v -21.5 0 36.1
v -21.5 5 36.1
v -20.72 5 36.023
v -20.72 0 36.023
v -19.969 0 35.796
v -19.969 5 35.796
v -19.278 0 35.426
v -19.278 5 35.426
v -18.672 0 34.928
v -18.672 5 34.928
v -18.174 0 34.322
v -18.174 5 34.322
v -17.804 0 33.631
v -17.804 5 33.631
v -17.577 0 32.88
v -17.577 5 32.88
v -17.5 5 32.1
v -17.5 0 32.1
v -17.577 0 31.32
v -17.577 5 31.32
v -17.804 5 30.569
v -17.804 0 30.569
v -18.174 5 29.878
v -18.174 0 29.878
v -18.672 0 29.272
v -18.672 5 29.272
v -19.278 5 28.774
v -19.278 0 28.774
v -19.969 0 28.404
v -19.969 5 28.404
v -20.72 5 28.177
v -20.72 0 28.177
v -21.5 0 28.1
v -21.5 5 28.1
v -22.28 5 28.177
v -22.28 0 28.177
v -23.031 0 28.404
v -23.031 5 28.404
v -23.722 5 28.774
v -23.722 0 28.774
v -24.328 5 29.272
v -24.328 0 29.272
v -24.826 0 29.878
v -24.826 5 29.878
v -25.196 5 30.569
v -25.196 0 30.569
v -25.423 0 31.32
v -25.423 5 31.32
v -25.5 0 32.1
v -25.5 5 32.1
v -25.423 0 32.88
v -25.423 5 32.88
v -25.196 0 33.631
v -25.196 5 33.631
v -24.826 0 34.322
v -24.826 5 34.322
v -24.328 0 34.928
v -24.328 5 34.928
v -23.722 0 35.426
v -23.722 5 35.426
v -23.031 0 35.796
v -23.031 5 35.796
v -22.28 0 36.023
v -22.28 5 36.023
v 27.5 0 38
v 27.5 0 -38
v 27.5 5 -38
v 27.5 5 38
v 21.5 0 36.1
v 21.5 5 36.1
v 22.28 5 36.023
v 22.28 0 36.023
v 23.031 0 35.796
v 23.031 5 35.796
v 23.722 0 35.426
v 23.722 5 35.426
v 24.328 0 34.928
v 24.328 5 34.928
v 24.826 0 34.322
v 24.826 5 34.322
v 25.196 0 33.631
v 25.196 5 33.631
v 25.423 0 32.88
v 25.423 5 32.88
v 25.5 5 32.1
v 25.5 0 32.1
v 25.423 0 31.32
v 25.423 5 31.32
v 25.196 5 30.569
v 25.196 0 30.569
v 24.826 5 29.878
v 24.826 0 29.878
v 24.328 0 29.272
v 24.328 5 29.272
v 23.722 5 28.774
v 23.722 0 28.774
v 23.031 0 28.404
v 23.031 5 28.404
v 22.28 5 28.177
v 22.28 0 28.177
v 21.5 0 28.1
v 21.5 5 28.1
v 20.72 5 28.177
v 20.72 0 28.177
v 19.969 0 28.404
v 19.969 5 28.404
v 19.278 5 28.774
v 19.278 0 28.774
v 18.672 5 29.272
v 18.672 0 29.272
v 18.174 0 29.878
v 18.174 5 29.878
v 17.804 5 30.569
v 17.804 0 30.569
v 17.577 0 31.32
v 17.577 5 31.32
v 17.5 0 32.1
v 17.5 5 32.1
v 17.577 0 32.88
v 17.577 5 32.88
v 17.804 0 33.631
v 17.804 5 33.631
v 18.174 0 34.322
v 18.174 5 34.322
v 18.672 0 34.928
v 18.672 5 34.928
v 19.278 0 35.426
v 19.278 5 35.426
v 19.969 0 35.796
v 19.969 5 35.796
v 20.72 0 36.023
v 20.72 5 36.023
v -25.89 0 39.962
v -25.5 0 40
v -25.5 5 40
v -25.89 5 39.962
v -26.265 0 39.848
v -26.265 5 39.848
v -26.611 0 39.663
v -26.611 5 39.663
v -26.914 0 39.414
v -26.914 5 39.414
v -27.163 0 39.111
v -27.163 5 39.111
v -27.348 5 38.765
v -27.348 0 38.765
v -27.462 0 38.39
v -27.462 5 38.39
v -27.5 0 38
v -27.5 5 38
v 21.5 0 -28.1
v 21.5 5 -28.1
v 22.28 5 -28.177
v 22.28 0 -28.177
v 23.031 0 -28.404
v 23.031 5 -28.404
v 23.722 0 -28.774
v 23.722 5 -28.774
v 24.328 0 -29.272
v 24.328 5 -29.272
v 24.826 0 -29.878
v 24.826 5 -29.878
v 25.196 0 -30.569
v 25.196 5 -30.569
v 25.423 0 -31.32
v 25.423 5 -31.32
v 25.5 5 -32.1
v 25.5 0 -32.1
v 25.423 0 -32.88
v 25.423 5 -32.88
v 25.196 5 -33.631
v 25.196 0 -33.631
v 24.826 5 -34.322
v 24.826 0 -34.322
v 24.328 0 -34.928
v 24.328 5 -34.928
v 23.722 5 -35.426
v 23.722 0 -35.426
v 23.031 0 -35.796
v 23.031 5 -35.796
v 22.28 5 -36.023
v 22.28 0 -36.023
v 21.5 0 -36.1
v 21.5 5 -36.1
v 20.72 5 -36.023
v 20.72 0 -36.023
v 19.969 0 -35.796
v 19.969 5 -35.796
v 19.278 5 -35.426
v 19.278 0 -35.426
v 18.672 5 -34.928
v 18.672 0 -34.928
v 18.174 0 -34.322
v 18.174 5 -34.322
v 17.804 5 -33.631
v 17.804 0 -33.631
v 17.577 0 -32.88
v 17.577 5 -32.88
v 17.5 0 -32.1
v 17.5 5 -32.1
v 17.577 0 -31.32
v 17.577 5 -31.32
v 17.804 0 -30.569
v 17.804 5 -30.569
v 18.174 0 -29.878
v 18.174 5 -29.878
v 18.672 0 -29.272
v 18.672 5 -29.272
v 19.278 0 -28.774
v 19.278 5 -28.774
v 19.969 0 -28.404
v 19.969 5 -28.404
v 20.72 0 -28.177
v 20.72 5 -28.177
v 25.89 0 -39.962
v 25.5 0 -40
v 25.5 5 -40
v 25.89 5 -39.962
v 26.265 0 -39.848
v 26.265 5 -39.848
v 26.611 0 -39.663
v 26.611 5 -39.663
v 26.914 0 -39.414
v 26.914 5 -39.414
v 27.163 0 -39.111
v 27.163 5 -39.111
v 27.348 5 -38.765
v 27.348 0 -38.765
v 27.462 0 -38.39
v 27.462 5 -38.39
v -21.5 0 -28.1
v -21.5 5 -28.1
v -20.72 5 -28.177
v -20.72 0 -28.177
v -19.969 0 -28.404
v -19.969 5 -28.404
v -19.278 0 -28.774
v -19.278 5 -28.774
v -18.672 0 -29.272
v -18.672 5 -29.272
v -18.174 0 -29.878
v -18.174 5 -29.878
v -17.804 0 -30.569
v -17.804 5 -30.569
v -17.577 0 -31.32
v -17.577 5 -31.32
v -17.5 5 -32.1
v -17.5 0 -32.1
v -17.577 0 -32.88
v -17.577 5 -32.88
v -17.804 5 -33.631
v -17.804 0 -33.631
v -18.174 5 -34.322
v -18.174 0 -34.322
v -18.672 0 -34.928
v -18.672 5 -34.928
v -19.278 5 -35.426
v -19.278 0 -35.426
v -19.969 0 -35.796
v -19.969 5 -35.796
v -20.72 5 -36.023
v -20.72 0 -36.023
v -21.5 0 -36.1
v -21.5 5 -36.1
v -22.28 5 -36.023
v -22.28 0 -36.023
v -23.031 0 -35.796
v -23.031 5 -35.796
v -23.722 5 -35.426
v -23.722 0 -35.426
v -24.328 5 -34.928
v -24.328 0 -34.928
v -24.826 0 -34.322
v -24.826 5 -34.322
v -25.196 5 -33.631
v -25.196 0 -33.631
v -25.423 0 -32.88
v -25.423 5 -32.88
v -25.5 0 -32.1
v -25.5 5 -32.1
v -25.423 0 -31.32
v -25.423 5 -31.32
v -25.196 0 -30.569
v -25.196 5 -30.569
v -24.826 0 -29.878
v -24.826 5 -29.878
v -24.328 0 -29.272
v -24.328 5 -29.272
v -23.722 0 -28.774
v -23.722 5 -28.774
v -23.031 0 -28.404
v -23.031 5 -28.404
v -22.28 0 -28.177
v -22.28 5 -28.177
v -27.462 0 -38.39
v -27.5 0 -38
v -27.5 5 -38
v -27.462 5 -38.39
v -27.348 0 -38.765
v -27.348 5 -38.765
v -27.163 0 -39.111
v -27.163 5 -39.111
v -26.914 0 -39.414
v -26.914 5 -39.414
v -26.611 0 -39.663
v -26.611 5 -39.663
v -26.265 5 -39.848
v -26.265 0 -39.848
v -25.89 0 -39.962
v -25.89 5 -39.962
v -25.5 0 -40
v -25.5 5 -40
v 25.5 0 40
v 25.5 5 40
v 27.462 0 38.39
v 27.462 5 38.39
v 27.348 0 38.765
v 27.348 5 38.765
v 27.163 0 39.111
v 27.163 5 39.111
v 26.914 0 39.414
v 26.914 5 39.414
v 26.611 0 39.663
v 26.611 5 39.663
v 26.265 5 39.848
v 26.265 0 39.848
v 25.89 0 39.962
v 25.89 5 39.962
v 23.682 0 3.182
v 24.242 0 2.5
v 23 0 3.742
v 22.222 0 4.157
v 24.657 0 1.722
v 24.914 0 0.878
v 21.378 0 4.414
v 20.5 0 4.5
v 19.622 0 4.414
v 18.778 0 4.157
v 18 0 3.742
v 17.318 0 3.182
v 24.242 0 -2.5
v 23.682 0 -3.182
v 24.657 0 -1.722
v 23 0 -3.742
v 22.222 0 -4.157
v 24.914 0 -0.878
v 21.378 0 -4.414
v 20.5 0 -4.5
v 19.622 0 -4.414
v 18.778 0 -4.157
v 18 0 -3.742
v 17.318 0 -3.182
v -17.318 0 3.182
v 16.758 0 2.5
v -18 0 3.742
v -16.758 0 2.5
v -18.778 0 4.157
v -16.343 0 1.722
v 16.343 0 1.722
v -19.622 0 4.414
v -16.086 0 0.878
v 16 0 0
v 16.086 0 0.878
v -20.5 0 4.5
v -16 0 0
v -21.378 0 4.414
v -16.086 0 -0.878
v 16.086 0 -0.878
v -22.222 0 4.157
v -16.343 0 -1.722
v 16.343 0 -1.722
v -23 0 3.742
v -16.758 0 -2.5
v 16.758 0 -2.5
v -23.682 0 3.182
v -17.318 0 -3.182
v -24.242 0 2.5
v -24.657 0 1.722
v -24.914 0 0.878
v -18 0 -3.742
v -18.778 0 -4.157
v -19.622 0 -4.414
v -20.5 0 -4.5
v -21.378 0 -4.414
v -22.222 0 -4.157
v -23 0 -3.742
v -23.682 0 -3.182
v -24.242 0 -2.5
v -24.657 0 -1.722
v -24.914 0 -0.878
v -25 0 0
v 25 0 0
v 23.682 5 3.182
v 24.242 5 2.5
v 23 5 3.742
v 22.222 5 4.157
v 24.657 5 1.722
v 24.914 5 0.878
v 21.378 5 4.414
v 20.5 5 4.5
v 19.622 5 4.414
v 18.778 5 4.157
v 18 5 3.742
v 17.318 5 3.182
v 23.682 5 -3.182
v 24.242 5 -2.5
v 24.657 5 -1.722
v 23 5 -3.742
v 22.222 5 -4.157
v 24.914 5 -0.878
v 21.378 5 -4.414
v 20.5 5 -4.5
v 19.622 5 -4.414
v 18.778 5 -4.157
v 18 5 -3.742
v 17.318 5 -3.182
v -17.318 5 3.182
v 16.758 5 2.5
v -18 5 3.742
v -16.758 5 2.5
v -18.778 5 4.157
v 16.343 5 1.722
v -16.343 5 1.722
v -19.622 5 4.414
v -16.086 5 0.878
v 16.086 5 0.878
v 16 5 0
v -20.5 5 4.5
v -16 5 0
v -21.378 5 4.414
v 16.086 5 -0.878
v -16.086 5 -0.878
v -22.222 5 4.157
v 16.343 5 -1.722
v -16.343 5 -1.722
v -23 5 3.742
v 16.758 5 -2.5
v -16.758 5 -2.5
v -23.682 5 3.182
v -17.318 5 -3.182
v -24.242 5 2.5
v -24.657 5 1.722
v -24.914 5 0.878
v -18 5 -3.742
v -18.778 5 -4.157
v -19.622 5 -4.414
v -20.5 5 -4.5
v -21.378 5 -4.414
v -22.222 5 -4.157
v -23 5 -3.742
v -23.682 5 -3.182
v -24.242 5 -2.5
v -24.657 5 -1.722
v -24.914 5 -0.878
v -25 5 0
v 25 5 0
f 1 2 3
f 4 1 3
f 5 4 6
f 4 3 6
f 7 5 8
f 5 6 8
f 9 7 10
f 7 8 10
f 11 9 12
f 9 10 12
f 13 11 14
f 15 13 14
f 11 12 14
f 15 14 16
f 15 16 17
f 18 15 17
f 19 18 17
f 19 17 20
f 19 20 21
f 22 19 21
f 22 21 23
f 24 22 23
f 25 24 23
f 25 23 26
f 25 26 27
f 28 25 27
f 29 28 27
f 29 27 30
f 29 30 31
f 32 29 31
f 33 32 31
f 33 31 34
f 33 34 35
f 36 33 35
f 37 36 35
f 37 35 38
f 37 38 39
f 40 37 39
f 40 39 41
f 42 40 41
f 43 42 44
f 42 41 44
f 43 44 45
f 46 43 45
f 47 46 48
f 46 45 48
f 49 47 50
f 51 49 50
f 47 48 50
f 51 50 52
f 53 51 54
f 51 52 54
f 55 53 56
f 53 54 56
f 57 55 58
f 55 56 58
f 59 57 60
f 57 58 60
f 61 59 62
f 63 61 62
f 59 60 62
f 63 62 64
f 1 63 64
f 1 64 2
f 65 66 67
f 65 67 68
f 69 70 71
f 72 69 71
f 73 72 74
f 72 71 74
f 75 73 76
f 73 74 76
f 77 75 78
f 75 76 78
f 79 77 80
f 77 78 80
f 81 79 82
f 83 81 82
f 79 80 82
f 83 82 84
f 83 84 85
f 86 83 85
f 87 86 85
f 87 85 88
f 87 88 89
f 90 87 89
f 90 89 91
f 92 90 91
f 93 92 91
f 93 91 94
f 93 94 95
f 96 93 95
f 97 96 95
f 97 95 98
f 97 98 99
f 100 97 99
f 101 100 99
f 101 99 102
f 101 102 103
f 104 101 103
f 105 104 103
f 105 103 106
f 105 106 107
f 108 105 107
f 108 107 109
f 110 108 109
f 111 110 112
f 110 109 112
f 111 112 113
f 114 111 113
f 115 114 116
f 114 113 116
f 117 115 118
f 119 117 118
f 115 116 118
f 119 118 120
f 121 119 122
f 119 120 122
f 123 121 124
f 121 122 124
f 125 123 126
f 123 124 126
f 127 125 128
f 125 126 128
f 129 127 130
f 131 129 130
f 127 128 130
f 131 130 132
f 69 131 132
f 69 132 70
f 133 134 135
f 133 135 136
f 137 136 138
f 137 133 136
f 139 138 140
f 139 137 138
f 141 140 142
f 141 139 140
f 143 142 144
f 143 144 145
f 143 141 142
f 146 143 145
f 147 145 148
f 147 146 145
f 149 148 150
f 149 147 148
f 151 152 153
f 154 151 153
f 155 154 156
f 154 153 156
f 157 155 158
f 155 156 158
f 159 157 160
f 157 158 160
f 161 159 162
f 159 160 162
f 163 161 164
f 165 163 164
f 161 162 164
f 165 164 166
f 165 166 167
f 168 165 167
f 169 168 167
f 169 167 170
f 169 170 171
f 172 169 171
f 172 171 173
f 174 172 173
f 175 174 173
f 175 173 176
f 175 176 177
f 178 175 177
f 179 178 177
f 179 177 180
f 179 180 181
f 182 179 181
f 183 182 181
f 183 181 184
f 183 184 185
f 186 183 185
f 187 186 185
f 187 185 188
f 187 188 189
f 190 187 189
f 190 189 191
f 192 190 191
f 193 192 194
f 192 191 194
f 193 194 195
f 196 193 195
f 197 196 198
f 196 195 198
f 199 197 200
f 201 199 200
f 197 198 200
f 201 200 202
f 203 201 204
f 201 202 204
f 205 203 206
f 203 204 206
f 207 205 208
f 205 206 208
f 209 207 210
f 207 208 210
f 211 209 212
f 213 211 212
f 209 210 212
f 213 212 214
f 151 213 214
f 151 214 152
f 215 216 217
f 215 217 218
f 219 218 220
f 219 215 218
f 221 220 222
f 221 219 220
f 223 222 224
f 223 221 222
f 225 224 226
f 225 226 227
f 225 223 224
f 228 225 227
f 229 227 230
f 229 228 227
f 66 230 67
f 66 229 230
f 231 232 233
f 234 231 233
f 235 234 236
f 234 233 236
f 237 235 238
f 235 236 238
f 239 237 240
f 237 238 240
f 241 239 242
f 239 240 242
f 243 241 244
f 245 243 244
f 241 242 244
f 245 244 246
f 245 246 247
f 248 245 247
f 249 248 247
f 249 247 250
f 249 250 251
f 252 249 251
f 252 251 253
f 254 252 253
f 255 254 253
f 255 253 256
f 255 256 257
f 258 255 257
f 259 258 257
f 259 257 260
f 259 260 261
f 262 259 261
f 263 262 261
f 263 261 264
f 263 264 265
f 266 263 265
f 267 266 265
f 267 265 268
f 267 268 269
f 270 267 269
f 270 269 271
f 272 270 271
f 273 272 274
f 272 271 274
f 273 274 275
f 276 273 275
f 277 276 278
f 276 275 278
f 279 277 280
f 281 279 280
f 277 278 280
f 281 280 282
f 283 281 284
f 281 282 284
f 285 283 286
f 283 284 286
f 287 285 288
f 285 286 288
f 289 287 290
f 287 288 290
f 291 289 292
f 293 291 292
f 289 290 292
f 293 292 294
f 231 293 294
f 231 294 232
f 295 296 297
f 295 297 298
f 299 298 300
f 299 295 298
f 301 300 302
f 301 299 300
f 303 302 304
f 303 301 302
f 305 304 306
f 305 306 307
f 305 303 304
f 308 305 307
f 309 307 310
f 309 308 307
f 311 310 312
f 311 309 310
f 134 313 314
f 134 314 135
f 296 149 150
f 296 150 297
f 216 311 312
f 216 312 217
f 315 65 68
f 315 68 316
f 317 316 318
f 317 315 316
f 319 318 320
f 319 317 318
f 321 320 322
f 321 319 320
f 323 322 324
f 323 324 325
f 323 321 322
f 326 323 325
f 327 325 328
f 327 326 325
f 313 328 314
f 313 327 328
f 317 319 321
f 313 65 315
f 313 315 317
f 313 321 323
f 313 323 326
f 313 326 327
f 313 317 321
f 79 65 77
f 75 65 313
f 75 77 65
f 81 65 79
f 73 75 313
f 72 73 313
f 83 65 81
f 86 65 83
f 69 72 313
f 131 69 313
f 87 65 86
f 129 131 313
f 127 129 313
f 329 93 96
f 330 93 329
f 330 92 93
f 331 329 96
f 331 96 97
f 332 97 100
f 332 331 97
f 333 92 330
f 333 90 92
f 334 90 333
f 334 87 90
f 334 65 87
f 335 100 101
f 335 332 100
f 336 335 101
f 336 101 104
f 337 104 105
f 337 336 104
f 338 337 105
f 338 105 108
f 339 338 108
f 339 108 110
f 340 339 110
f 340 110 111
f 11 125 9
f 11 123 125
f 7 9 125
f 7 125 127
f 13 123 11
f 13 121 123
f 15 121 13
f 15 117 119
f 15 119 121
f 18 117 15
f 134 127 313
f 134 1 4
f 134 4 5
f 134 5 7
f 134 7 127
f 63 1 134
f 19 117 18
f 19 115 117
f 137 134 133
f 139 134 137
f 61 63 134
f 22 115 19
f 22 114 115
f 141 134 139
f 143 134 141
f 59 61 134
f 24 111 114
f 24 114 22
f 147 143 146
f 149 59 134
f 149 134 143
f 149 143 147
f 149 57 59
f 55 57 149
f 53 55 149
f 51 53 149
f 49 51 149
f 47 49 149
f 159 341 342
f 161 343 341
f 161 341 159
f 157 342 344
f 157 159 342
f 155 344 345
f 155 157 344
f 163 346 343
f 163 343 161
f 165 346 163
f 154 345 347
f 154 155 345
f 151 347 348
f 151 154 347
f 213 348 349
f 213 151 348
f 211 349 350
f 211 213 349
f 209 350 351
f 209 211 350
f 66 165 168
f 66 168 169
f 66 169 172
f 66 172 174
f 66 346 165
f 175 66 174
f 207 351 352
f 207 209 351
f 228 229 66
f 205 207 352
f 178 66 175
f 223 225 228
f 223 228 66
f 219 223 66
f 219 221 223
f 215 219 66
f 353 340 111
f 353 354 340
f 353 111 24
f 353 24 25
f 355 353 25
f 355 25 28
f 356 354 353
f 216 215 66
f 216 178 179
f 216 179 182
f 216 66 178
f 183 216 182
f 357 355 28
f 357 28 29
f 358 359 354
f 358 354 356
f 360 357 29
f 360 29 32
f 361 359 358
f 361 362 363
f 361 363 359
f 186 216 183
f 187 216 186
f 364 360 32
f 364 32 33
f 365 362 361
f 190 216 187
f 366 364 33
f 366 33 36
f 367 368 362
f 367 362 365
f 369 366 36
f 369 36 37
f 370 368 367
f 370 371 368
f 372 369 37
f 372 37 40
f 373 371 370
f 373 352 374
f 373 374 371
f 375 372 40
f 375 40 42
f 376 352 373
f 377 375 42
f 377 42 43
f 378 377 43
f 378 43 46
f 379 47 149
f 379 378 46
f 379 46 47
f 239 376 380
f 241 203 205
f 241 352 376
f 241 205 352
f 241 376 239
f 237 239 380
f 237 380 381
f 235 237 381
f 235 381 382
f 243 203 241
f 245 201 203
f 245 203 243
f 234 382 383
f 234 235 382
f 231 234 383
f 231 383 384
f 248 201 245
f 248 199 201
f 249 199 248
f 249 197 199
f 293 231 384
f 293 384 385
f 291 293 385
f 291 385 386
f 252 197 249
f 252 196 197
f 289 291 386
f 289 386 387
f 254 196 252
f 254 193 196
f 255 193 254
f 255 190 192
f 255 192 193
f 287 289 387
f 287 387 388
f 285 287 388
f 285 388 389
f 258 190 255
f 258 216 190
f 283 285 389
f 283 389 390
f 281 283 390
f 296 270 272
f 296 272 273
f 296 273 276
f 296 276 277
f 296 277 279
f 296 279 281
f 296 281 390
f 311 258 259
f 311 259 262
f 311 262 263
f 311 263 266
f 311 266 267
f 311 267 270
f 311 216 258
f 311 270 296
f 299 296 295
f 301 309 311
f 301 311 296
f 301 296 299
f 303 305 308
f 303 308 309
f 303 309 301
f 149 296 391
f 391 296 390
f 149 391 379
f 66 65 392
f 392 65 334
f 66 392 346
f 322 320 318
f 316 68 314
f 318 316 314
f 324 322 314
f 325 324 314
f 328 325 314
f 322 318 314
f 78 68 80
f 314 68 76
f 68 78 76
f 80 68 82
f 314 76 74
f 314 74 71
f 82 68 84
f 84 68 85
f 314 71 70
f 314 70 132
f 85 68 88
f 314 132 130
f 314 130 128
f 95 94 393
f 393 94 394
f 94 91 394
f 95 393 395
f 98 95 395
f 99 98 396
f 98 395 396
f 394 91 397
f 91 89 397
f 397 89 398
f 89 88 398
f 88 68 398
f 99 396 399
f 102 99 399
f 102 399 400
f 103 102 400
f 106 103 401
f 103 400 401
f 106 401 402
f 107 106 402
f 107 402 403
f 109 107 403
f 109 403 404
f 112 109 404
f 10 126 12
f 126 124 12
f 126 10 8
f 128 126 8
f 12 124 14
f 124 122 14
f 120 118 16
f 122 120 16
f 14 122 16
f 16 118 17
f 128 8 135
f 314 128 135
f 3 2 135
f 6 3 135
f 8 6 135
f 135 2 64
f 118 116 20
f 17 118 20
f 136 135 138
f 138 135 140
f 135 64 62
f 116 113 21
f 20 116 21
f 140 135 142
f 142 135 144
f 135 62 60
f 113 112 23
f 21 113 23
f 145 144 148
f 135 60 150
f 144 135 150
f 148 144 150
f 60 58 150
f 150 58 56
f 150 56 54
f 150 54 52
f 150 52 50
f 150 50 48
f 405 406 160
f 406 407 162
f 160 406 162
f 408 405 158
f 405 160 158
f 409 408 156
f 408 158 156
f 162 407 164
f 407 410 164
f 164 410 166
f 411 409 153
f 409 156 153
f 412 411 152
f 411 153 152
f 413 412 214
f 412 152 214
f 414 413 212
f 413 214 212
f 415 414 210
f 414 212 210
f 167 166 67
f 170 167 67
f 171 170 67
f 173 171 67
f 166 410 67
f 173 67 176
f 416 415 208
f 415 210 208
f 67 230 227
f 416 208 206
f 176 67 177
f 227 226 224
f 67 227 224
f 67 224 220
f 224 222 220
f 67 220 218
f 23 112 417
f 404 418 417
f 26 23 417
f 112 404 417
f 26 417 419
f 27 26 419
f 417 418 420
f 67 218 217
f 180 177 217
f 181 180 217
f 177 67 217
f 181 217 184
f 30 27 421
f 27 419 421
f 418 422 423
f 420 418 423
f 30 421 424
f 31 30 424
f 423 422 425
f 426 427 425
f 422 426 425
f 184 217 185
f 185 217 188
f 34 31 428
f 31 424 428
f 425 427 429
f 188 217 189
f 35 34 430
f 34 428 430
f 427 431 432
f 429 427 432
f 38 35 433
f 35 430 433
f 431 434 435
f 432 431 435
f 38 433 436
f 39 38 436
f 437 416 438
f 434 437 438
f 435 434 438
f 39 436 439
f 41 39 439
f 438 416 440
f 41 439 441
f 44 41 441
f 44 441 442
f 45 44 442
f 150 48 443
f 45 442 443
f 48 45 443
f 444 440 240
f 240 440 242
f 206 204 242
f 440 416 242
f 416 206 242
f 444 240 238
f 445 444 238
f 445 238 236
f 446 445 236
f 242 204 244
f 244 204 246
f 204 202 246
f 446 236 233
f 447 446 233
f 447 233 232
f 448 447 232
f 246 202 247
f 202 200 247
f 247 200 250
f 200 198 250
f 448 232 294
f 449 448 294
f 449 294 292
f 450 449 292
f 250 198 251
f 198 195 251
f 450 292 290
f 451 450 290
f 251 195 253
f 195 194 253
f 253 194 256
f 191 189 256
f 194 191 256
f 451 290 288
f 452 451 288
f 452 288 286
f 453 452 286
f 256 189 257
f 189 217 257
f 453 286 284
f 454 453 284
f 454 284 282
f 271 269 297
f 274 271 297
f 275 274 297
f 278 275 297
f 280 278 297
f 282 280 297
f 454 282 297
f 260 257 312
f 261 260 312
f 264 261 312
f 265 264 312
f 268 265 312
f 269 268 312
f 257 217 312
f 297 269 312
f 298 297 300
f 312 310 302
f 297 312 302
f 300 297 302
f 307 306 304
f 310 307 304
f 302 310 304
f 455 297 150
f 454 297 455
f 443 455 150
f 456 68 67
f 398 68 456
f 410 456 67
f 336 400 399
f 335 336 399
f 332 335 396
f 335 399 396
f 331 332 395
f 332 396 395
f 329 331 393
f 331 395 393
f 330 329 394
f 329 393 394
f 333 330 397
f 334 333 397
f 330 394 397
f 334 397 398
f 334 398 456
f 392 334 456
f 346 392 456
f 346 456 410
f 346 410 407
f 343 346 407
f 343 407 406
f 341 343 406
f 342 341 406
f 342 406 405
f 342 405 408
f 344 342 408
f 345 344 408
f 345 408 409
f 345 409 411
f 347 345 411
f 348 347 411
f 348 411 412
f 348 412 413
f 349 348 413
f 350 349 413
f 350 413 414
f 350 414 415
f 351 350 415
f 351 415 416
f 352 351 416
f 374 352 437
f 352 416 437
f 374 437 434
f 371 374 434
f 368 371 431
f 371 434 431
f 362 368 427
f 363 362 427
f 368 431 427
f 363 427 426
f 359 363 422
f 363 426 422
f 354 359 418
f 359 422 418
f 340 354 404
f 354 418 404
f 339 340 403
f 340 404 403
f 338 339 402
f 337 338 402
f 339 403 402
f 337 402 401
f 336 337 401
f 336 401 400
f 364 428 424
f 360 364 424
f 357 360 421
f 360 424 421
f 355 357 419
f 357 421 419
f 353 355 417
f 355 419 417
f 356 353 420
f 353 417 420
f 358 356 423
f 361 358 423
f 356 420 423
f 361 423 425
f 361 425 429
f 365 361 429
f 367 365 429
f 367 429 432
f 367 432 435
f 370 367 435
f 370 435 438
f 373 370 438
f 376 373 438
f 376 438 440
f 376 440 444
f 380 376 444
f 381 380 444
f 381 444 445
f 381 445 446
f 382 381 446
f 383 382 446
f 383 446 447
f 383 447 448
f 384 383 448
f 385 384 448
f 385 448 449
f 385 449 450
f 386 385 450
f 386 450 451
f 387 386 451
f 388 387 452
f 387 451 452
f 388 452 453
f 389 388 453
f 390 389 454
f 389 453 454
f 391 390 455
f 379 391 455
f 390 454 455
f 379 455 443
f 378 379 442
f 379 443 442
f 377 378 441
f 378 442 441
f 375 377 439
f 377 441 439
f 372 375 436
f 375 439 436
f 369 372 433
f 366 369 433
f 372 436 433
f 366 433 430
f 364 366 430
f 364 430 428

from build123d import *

# Parameters (mm, degrees)
SALIENTE_EXTRUIR1_DEPTH = 5
CROQUIS2_R              = 4.5
CROQUIS2_R_2            = 4
CORTAR_EXTRUIR1_DEPTH   = 10


with BuildPart() as part:
    # Croquis1 → Saliente-Extruir1 (new body)
    with BuildSketch(Plane(origin=(0, 0, 0), x_dir=(1, 0, 0), z_dir=(0, 1, 0))):
        with BuildLine():
            Line((-27.5, -38), (-27.5, 38))
            ThreePointArc((-27.5, 38), (-26.914213562, 39.414213562), (-25.5, 40))
            Line((-25.5, 40), (25.5, 40))
            ThreePointArc((25.5, 40), (26.914213562, 39.414213562), (27.5, 38))
            Line((27.5, 38), (27.5, -38))
            ThreePointArc((27.5, -38), (26.914213562, -39.414213562), (25.5, -40))
            Line((25.5, -40), (-25.5, -40))
            ThreePointArc((-25.5, -40), (-26.914213562, -39.414213562), (-27.5, -38))
        make_face()
    extrude(amount=SALIENTE_EXTRUIR1_DEPTH)

    # Croquis2 → Cortar-Extruir1 (cut)
    with BuildSketch(Plane(origin=(0, 5, 0), x_dir=(1, 0, 0), z_dir=(0, 1, 0))):
        with Locations(Location((-20.5, 0, 0), (0, 0, 270))):
            Circle(CROQUIS2_R)
        with Locations(Location((20.5, 0, 0), (0, 0, 270))):
            Circle(CROQUIS2_R)
        with Locations(Location((-21.5, 32.1, 0), (0, 0, 270))):
            Circle(CROQUIS2_R_2)
        with Locations(Location((-21.5, -32.1, 0), (0, 0, 270))):
            Circle(CROQUIS2_R_2)
        with Locations(Location((21.5, 32.1, 0), (0, 0, 270))):
            Circle(CROQUIS2_R_2)
        with Locations(Location((21.5, -32.1, 0), (0, 0, 270))):
            Circle(CROQUIS2_R_2)
    extrude(amount=-CORTAR_EXTRUIR1_DEPTH, mode=Mode.SUBTRACT)


solid = part.part
